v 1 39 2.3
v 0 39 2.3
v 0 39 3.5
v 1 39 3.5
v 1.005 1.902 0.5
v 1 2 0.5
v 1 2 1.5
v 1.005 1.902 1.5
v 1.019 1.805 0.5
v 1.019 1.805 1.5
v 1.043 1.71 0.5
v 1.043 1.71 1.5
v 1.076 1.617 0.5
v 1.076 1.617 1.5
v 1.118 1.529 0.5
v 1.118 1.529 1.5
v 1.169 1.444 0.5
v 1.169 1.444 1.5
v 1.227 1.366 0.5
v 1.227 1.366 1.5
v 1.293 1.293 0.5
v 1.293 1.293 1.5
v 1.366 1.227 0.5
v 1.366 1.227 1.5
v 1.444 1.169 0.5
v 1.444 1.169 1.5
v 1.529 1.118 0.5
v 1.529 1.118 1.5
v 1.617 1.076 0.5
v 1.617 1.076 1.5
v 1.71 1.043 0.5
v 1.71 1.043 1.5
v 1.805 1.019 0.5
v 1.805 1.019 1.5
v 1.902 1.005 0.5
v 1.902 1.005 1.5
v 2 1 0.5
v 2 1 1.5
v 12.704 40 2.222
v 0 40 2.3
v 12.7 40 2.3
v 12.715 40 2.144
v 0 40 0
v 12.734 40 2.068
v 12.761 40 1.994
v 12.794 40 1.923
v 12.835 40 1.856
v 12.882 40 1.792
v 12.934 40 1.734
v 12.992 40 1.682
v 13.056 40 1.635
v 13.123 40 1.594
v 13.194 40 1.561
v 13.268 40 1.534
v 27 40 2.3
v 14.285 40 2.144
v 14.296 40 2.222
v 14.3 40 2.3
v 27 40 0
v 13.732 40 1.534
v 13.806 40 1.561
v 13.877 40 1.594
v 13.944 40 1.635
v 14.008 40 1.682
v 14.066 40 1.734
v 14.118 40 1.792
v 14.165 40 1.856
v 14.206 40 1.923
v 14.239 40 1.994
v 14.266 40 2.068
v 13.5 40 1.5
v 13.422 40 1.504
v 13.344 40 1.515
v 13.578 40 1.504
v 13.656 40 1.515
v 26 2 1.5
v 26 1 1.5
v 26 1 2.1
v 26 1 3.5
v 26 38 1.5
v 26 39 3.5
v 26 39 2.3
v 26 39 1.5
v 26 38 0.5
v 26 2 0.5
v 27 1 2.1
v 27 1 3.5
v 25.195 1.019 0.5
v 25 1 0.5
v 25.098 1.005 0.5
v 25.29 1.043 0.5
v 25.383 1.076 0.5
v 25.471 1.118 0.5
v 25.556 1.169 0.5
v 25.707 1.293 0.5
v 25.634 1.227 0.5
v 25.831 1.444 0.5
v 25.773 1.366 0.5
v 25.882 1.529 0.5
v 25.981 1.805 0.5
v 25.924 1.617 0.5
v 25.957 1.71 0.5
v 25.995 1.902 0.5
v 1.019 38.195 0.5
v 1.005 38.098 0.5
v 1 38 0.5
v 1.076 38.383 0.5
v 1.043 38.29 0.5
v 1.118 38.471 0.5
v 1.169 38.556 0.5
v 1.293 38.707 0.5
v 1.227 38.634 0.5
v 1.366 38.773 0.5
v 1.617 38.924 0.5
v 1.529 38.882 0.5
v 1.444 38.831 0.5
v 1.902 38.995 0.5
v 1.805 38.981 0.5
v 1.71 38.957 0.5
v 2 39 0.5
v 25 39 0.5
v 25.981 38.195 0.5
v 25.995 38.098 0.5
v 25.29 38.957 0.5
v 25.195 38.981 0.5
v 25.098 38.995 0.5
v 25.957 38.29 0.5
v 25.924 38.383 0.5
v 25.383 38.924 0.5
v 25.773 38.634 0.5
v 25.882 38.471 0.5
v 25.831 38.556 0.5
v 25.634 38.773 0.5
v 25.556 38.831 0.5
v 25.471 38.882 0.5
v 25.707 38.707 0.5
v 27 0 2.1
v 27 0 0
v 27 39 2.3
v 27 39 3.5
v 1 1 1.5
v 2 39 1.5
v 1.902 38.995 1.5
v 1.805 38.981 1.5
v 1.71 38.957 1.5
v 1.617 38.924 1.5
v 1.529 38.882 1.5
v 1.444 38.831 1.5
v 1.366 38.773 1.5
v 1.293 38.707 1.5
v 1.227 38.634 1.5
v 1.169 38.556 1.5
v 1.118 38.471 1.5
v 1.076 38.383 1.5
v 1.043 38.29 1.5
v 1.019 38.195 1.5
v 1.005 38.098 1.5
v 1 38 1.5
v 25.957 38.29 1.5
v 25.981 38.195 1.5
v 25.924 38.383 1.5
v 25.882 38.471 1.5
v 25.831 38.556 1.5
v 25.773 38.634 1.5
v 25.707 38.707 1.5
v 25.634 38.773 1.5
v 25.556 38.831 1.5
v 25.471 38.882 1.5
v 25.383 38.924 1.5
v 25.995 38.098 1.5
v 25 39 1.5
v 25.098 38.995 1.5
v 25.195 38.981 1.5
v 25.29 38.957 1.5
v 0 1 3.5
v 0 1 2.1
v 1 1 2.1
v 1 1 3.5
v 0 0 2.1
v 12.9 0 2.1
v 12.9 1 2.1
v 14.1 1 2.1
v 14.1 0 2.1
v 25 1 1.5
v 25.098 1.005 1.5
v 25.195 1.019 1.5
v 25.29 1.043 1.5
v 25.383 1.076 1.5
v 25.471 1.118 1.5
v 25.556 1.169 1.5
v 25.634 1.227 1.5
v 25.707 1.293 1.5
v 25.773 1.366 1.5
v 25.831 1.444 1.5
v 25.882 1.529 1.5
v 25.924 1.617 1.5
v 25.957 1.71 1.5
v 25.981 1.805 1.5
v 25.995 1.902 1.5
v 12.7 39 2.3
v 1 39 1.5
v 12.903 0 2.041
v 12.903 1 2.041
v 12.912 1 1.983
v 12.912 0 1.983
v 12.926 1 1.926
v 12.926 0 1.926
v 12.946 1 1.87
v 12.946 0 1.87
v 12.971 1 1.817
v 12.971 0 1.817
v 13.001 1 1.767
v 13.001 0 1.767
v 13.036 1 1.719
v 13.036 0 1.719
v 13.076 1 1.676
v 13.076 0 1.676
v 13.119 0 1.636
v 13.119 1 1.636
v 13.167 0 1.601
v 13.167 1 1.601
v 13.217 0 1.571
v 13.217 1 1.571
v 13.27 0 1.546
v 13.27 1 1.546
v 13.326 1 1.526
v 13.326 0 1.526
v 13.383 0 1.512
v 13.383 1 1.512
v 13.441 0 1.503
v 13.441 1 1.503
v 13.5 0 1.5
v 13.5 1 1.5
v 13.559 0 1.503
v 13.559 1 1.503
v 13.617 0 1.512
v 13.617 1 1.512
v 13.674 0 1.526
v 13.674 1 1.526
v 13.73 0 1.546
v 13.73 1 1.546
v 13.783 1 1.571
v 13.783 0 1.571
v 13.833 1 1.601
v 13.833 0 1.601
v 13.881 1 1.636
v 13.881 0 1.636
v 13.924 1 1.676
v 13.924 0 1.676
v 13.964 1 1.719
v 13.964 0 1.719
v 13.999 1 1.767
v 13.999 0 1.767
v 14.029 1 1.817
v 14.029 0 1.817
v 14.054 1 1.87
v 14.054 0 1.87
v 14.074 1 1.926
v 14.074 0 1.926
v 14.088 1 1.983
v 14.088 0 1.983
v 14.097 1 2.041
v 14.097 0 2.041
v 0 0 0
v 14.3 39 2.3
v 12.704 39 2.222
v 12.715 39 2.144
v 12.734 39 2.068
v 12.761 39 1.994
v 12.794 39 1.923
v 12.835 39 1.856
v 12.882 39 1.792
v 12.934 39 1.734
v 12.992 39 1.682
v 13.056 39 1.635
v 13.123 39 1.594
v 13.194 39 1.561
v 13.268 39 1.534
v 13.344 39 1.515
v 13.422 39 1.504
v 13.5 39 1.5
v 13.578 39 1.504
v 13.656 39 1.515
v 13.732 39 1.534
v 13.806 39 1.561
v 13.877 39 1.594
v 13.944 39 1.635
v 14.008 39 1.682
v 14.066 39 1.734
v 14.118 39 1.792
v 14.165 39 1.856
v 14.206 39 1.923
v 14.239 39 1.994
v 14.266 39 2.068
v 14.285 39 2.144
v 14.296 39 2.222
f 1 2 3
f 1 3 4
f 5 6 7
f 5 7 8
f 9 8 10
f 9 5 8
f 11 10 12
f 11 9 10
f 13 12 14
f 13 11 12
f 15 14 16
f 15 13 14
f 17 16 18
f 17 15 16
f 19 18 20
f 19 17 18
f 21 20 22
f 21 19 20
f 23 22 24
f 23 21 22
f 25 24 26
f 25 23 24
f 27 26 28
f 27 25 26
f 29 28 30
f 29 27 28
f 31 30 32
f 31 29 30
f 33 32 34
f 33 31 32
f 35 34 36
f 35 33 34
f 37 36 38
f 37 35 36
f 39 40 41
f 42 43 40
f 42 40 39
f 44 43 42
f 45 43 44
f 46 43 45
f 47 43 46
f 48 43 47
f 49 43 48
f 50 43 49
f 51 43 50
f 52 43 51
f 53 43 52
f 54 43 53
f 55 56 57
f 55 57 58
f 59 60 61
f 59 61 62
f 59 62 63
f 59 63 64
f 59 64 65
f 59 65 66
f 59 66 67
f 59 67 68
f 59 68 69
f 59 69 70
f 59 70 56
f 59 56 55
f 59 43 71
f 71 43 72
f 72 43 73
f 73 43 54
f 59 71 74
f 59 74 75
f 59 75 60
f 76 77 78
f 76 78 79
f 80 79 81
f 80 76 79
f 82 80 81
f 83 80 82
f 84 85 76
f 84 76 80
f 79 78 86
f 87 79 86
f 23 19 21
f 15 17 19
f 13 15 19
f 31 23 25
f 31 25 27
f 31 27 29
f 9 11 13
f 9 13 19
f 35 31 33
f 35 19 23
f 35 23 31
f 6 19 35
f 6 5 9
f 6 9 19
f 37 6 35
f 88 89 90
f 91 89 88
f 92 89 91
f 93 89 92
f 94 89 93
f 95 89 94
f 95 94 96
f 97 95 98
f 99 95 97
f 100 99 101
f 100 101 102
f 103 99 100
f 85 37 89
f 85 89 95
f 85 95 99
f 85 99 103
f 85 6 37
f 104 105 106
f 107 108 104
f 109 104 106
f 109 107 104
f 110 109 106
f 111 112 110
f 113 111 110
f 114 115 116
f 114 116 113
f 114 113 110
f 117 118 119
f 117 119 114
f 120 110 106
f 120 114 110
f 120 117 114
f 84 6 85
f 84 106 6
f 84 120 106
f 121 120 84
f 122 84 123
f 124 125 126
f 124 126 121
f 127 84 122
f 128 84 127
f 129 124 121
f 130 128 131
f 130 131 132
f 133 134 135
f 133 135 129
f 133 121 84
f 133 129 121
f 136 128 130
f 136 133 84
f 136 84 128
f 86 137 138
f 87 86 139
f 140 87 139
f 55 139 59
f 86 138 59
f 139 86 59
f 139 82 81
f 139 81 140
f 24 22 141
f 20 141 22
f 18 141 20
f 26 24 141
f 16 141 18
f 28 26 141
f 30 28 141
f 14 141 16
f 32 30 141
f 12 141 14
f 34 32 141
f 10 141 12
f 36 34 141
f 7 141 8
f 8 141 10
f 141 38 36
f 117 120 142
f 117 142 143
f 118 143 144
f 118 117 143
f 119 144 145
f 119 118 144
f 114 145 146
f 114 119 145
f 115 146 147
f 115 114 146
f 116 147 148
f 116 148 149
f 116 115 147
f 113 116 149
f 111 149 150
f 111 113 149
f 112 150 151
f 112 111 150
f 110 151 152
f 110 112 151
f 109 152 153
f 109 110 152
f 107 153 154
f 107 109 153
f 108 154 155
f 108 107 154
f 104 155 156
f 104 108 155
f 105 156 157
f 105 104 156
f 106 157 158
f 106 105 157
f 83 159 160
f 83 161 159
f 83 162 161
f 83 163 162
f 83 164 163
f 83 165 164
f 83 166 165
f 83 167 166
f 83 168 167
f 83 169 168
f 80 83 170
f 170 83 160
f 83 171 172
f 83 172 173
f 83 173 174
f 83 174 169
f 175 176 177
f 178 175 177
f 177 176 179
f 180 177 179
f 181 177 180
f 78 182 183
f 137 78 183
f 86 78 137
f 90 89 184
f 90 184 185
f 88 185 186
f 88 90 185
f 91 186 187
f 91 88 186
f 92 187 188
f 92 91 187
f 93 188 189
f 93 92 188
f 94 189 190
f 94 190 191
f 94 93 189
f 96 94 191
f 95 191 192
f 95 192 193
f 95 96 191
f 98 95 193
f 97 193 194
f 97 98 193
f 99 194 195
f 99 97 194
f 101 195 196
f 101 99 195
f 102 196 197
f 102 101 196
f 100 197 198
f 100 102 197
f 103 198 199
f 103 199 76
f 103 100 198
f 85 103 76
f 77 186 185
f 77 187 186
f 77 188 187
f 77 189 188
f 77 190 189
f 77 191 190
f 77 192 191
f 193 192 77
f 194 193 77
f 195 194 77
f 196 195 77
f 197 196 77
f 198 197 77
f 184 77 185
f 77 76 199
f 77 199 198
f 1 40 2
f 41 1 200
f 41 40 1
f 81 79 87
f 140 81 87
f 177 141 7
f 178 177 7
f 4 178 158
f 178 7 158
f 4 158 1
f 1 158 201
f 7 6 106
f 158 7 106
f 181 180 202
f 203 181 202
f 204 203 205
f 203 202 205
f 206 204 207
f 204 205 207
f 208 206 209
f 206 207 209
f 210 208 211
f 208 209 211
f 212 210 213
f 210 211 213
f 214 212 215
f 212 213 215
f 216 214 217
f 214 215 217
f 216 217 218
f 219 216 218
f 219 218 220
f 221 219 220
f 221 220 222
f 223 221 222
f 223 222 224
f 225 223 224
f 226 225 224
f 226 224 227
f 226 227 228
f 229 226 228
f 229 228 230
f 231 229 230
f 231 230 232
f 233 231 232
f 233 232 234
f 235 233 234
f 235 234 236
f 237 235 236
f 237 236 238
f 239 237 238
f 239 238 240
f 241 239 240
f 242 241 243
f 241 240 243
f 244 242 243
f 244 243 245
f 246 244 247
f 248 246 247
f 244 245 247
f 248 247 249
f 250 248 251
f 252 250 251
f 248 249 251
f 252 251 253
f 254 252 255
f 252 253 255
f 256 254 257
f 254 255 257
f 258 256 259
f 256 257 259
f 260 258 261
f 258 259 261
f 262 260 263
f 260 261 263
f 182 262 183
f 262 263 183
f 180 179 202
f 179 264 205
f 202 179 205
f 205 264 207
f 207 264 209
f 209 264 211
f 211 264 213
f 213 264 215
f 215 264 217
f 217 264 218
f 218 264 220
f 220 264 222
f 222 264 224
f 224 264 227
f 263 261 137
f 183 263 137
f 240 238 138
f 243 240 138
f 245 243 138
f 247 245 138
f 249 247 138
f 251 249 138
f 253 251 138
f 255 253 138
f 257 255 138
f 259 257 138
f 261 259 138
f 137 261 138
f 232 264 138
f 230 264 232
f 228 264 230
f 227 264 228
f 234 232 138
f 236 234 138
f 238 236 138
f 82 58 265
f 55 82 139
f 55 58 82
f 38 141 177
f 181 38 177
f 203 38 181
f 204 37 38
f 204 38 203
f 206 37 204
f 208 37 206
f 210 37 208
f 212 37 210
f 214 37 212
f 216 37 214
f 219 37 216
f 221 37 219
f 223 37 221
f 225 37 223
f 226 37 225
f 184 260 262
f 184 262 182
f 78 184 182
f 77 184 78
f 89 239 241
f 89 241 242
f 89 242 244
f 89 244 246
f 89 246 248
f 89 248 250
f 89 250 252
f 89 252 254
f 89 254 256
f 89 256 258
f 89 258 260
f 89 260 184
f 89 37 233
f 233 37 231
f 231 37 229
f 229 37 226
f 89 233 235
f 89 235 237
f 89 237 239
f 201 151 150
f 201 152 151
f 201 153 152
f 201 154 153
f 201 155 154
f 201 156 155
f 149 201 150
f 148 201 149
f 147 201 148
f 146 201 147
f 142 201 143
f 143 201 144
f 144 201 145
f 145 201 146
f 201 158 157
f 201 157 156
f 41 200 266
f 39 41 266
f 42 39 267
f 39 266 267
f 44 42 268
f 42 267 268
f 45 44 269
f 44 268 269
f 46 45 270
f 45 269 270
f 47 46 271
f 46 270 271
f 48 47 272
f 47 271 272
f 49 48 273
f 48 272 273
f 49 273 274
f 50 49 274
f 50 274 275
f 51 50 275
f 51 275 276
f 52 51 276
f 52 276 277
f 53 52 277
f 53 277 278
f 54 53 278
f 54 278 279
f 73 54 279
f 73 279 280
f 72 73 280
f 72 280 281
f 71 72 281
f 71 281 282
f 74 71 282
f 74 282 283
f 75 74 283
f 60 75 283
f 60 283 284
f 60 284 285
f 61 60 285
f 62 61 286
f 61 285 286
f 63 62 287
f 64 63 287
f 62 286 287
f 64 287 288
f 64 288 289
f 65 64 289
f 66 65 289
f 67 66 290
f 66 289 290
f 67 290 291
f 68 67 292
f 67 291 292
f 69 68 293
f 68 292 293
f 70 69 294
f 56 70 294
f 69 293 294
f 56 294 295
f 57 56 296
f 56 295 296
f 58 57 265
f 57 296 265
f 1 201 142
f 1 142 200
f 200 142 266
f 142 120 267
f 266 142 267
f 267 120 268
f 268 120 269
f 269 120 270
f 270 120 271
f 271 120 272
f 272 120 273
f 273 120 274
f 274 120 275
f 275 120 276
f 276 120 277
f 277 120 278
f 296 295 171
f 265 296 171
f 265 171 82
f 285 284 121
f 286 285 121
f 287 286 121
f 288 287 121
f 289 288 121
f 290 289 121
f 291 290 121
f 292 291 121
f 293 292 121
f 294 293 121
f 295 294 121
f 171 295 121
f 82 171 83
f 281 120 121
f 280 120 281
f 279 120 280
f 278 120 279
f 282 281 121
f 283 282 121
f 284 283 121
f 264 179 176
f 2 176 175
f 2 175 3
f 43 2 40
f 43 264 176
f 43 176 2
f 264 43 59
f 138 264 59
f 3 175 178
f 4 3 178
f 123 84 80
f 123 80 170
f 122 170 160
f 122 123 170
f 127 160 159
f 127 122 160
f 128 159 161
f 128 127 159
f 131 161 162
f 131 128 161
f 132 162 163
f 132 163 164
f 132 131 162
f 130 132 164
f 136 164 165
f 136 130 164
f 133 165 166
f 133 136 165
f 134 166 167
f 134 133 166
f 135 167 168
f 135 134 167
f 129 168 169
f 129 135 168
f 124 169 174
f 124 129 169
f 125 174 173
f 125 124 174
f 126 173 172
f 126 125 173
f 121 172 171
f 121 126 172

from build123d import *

# Parameters (mm, degrees)
SKETCH_13_W         = 27
SKETCH_13_H         = 40
EXTRUDE_11_DEPTH    = 0.5
SKETCH_14_W         = 27
SKETCH_14_H         = 40
EXTRUDE_14_DEPTH    = 1
SKETCH_17_W         = 27
SKETCH_17_H         = 1
EXTRUDE_15_DEPTH    = 0.8
SKETCH_18_R         = 0.8
CUT_EXTRUDE_4_DEPTH = 2
SKETCH_22_W         = 27
SKETCH_22_H         = 1
EXTRUDE_18_DEPTH    = 0.6
SKETCH_23_R         = 0.6
CUT_EXTRUDE_6_DEPTH = 1
SKETCH_24_W         = 1
SKETCH_24_H         = 38
EXTRUDE_19_DEPTH    = 2
SKETCH_25_W         = 1
SKETCH_25_H         = 38
EXTRUDE_20_DEPTH    = 2


with BuildPart() as part:
    # 草图13 → 凸台-拉伸11 (new body)
    with BuildSketch(Plane.XY):
        with Locations((13.5, 20)):
            Rectangle(SKETCH_13_W, SKETCH_13_H)
    extrude(amount=EXTRUDE_11_DEPTH)

    # 草图14 → 凸台-拉伸14 (add)
    with BuildSketch(Plane.XY.offset(0.5)):
        with Locations((13.5, 20)):
            Rectangle(SKETCH_14_W, SKETCH_14_H)
        with BuildLine():
            Line((2, 1), (25, 1))
            ThreePointArc((25, 1), (25.707106781, 1.292893219), (26, 2))
            Line((26, 2), (26, 38))
            ThreePointArc((26, 38), (25.707106781, 38.707106781), (25, 39))
            Line((25, 39), (2, 39))
            ThreePointArc((2, 39), (1.292893219, 38.707106781), (1, 38))
            Line((1, 38), (1, 2))
            ThreePointArc((1, 2), (1.292893219, 1.292893219), (2, 1))
        make_face(mode=Mode.SUBTRACT)
    extrude(amount=EXTRUDE_14_DEPTH)

    # 草图17 → 凸台-拉伸15 (add)
    with BuildSketch(Plane.XY.offset(1.5)):
        with Locations((13.5, 39.5)):
            Rectangle(SKETCH_17_W, SKETCH_17_H)
    extrude(amount=EXTRUDE_15_DEPTH)

    # 草图18 → 切除-拉伸4 (cut, through all)
    with BuildSketch(Plane.XZ.offset(-39)):
        with Locations((13.5, 2.3)):
            Circle(SKETCH_18_R)
    extrude(amount=-CUT_EXTRUDE_4_DEPTH, mode=Mode.SUBTRACT)

    # 草图22 → 凸台-拉伸18 (add)
    with BuildSketch(Plane.XY.offset(1.5)):
        with Locations((13.5, 0.5)):
            Rectangle(SKETCH_22_W, SKETCH_22_H)
    extrude(amount=EXTRUDE_18_DEPTH)

    # 草图23 → 切除-拉伸6 (cut)
    with BuildSketch(Plane.XZ):
        with Locations((13.5, 2.1)):
            Circle(SKETCH_23_R)
    extrude(amount=-CUT_EXTRUDE_6_DEPTH, mode=Mode.SUBTRACT)

    # 草图24 → 凸台-拉伸19 (add)
    with BuildSketch(Plane.XY.offset(1.5)):
        with Locations((26.5, 20)):
            Rectangle(SKETCH_24_W, SKETCH_24_H)
    extrude(amount=EXTRUDE_19_DEPTH)

    # 草图25 → 凸台-拉伸20 (add)
    with BuildSketch(Plane.XY.offset(1.5)):
        with Locations((0.5, 20)):
            Rectangle(SKETCH_25_W, SKETCH_25_H)
    extrude(amount=EXTRUDE_20_DEPTH)


solid = part.part
